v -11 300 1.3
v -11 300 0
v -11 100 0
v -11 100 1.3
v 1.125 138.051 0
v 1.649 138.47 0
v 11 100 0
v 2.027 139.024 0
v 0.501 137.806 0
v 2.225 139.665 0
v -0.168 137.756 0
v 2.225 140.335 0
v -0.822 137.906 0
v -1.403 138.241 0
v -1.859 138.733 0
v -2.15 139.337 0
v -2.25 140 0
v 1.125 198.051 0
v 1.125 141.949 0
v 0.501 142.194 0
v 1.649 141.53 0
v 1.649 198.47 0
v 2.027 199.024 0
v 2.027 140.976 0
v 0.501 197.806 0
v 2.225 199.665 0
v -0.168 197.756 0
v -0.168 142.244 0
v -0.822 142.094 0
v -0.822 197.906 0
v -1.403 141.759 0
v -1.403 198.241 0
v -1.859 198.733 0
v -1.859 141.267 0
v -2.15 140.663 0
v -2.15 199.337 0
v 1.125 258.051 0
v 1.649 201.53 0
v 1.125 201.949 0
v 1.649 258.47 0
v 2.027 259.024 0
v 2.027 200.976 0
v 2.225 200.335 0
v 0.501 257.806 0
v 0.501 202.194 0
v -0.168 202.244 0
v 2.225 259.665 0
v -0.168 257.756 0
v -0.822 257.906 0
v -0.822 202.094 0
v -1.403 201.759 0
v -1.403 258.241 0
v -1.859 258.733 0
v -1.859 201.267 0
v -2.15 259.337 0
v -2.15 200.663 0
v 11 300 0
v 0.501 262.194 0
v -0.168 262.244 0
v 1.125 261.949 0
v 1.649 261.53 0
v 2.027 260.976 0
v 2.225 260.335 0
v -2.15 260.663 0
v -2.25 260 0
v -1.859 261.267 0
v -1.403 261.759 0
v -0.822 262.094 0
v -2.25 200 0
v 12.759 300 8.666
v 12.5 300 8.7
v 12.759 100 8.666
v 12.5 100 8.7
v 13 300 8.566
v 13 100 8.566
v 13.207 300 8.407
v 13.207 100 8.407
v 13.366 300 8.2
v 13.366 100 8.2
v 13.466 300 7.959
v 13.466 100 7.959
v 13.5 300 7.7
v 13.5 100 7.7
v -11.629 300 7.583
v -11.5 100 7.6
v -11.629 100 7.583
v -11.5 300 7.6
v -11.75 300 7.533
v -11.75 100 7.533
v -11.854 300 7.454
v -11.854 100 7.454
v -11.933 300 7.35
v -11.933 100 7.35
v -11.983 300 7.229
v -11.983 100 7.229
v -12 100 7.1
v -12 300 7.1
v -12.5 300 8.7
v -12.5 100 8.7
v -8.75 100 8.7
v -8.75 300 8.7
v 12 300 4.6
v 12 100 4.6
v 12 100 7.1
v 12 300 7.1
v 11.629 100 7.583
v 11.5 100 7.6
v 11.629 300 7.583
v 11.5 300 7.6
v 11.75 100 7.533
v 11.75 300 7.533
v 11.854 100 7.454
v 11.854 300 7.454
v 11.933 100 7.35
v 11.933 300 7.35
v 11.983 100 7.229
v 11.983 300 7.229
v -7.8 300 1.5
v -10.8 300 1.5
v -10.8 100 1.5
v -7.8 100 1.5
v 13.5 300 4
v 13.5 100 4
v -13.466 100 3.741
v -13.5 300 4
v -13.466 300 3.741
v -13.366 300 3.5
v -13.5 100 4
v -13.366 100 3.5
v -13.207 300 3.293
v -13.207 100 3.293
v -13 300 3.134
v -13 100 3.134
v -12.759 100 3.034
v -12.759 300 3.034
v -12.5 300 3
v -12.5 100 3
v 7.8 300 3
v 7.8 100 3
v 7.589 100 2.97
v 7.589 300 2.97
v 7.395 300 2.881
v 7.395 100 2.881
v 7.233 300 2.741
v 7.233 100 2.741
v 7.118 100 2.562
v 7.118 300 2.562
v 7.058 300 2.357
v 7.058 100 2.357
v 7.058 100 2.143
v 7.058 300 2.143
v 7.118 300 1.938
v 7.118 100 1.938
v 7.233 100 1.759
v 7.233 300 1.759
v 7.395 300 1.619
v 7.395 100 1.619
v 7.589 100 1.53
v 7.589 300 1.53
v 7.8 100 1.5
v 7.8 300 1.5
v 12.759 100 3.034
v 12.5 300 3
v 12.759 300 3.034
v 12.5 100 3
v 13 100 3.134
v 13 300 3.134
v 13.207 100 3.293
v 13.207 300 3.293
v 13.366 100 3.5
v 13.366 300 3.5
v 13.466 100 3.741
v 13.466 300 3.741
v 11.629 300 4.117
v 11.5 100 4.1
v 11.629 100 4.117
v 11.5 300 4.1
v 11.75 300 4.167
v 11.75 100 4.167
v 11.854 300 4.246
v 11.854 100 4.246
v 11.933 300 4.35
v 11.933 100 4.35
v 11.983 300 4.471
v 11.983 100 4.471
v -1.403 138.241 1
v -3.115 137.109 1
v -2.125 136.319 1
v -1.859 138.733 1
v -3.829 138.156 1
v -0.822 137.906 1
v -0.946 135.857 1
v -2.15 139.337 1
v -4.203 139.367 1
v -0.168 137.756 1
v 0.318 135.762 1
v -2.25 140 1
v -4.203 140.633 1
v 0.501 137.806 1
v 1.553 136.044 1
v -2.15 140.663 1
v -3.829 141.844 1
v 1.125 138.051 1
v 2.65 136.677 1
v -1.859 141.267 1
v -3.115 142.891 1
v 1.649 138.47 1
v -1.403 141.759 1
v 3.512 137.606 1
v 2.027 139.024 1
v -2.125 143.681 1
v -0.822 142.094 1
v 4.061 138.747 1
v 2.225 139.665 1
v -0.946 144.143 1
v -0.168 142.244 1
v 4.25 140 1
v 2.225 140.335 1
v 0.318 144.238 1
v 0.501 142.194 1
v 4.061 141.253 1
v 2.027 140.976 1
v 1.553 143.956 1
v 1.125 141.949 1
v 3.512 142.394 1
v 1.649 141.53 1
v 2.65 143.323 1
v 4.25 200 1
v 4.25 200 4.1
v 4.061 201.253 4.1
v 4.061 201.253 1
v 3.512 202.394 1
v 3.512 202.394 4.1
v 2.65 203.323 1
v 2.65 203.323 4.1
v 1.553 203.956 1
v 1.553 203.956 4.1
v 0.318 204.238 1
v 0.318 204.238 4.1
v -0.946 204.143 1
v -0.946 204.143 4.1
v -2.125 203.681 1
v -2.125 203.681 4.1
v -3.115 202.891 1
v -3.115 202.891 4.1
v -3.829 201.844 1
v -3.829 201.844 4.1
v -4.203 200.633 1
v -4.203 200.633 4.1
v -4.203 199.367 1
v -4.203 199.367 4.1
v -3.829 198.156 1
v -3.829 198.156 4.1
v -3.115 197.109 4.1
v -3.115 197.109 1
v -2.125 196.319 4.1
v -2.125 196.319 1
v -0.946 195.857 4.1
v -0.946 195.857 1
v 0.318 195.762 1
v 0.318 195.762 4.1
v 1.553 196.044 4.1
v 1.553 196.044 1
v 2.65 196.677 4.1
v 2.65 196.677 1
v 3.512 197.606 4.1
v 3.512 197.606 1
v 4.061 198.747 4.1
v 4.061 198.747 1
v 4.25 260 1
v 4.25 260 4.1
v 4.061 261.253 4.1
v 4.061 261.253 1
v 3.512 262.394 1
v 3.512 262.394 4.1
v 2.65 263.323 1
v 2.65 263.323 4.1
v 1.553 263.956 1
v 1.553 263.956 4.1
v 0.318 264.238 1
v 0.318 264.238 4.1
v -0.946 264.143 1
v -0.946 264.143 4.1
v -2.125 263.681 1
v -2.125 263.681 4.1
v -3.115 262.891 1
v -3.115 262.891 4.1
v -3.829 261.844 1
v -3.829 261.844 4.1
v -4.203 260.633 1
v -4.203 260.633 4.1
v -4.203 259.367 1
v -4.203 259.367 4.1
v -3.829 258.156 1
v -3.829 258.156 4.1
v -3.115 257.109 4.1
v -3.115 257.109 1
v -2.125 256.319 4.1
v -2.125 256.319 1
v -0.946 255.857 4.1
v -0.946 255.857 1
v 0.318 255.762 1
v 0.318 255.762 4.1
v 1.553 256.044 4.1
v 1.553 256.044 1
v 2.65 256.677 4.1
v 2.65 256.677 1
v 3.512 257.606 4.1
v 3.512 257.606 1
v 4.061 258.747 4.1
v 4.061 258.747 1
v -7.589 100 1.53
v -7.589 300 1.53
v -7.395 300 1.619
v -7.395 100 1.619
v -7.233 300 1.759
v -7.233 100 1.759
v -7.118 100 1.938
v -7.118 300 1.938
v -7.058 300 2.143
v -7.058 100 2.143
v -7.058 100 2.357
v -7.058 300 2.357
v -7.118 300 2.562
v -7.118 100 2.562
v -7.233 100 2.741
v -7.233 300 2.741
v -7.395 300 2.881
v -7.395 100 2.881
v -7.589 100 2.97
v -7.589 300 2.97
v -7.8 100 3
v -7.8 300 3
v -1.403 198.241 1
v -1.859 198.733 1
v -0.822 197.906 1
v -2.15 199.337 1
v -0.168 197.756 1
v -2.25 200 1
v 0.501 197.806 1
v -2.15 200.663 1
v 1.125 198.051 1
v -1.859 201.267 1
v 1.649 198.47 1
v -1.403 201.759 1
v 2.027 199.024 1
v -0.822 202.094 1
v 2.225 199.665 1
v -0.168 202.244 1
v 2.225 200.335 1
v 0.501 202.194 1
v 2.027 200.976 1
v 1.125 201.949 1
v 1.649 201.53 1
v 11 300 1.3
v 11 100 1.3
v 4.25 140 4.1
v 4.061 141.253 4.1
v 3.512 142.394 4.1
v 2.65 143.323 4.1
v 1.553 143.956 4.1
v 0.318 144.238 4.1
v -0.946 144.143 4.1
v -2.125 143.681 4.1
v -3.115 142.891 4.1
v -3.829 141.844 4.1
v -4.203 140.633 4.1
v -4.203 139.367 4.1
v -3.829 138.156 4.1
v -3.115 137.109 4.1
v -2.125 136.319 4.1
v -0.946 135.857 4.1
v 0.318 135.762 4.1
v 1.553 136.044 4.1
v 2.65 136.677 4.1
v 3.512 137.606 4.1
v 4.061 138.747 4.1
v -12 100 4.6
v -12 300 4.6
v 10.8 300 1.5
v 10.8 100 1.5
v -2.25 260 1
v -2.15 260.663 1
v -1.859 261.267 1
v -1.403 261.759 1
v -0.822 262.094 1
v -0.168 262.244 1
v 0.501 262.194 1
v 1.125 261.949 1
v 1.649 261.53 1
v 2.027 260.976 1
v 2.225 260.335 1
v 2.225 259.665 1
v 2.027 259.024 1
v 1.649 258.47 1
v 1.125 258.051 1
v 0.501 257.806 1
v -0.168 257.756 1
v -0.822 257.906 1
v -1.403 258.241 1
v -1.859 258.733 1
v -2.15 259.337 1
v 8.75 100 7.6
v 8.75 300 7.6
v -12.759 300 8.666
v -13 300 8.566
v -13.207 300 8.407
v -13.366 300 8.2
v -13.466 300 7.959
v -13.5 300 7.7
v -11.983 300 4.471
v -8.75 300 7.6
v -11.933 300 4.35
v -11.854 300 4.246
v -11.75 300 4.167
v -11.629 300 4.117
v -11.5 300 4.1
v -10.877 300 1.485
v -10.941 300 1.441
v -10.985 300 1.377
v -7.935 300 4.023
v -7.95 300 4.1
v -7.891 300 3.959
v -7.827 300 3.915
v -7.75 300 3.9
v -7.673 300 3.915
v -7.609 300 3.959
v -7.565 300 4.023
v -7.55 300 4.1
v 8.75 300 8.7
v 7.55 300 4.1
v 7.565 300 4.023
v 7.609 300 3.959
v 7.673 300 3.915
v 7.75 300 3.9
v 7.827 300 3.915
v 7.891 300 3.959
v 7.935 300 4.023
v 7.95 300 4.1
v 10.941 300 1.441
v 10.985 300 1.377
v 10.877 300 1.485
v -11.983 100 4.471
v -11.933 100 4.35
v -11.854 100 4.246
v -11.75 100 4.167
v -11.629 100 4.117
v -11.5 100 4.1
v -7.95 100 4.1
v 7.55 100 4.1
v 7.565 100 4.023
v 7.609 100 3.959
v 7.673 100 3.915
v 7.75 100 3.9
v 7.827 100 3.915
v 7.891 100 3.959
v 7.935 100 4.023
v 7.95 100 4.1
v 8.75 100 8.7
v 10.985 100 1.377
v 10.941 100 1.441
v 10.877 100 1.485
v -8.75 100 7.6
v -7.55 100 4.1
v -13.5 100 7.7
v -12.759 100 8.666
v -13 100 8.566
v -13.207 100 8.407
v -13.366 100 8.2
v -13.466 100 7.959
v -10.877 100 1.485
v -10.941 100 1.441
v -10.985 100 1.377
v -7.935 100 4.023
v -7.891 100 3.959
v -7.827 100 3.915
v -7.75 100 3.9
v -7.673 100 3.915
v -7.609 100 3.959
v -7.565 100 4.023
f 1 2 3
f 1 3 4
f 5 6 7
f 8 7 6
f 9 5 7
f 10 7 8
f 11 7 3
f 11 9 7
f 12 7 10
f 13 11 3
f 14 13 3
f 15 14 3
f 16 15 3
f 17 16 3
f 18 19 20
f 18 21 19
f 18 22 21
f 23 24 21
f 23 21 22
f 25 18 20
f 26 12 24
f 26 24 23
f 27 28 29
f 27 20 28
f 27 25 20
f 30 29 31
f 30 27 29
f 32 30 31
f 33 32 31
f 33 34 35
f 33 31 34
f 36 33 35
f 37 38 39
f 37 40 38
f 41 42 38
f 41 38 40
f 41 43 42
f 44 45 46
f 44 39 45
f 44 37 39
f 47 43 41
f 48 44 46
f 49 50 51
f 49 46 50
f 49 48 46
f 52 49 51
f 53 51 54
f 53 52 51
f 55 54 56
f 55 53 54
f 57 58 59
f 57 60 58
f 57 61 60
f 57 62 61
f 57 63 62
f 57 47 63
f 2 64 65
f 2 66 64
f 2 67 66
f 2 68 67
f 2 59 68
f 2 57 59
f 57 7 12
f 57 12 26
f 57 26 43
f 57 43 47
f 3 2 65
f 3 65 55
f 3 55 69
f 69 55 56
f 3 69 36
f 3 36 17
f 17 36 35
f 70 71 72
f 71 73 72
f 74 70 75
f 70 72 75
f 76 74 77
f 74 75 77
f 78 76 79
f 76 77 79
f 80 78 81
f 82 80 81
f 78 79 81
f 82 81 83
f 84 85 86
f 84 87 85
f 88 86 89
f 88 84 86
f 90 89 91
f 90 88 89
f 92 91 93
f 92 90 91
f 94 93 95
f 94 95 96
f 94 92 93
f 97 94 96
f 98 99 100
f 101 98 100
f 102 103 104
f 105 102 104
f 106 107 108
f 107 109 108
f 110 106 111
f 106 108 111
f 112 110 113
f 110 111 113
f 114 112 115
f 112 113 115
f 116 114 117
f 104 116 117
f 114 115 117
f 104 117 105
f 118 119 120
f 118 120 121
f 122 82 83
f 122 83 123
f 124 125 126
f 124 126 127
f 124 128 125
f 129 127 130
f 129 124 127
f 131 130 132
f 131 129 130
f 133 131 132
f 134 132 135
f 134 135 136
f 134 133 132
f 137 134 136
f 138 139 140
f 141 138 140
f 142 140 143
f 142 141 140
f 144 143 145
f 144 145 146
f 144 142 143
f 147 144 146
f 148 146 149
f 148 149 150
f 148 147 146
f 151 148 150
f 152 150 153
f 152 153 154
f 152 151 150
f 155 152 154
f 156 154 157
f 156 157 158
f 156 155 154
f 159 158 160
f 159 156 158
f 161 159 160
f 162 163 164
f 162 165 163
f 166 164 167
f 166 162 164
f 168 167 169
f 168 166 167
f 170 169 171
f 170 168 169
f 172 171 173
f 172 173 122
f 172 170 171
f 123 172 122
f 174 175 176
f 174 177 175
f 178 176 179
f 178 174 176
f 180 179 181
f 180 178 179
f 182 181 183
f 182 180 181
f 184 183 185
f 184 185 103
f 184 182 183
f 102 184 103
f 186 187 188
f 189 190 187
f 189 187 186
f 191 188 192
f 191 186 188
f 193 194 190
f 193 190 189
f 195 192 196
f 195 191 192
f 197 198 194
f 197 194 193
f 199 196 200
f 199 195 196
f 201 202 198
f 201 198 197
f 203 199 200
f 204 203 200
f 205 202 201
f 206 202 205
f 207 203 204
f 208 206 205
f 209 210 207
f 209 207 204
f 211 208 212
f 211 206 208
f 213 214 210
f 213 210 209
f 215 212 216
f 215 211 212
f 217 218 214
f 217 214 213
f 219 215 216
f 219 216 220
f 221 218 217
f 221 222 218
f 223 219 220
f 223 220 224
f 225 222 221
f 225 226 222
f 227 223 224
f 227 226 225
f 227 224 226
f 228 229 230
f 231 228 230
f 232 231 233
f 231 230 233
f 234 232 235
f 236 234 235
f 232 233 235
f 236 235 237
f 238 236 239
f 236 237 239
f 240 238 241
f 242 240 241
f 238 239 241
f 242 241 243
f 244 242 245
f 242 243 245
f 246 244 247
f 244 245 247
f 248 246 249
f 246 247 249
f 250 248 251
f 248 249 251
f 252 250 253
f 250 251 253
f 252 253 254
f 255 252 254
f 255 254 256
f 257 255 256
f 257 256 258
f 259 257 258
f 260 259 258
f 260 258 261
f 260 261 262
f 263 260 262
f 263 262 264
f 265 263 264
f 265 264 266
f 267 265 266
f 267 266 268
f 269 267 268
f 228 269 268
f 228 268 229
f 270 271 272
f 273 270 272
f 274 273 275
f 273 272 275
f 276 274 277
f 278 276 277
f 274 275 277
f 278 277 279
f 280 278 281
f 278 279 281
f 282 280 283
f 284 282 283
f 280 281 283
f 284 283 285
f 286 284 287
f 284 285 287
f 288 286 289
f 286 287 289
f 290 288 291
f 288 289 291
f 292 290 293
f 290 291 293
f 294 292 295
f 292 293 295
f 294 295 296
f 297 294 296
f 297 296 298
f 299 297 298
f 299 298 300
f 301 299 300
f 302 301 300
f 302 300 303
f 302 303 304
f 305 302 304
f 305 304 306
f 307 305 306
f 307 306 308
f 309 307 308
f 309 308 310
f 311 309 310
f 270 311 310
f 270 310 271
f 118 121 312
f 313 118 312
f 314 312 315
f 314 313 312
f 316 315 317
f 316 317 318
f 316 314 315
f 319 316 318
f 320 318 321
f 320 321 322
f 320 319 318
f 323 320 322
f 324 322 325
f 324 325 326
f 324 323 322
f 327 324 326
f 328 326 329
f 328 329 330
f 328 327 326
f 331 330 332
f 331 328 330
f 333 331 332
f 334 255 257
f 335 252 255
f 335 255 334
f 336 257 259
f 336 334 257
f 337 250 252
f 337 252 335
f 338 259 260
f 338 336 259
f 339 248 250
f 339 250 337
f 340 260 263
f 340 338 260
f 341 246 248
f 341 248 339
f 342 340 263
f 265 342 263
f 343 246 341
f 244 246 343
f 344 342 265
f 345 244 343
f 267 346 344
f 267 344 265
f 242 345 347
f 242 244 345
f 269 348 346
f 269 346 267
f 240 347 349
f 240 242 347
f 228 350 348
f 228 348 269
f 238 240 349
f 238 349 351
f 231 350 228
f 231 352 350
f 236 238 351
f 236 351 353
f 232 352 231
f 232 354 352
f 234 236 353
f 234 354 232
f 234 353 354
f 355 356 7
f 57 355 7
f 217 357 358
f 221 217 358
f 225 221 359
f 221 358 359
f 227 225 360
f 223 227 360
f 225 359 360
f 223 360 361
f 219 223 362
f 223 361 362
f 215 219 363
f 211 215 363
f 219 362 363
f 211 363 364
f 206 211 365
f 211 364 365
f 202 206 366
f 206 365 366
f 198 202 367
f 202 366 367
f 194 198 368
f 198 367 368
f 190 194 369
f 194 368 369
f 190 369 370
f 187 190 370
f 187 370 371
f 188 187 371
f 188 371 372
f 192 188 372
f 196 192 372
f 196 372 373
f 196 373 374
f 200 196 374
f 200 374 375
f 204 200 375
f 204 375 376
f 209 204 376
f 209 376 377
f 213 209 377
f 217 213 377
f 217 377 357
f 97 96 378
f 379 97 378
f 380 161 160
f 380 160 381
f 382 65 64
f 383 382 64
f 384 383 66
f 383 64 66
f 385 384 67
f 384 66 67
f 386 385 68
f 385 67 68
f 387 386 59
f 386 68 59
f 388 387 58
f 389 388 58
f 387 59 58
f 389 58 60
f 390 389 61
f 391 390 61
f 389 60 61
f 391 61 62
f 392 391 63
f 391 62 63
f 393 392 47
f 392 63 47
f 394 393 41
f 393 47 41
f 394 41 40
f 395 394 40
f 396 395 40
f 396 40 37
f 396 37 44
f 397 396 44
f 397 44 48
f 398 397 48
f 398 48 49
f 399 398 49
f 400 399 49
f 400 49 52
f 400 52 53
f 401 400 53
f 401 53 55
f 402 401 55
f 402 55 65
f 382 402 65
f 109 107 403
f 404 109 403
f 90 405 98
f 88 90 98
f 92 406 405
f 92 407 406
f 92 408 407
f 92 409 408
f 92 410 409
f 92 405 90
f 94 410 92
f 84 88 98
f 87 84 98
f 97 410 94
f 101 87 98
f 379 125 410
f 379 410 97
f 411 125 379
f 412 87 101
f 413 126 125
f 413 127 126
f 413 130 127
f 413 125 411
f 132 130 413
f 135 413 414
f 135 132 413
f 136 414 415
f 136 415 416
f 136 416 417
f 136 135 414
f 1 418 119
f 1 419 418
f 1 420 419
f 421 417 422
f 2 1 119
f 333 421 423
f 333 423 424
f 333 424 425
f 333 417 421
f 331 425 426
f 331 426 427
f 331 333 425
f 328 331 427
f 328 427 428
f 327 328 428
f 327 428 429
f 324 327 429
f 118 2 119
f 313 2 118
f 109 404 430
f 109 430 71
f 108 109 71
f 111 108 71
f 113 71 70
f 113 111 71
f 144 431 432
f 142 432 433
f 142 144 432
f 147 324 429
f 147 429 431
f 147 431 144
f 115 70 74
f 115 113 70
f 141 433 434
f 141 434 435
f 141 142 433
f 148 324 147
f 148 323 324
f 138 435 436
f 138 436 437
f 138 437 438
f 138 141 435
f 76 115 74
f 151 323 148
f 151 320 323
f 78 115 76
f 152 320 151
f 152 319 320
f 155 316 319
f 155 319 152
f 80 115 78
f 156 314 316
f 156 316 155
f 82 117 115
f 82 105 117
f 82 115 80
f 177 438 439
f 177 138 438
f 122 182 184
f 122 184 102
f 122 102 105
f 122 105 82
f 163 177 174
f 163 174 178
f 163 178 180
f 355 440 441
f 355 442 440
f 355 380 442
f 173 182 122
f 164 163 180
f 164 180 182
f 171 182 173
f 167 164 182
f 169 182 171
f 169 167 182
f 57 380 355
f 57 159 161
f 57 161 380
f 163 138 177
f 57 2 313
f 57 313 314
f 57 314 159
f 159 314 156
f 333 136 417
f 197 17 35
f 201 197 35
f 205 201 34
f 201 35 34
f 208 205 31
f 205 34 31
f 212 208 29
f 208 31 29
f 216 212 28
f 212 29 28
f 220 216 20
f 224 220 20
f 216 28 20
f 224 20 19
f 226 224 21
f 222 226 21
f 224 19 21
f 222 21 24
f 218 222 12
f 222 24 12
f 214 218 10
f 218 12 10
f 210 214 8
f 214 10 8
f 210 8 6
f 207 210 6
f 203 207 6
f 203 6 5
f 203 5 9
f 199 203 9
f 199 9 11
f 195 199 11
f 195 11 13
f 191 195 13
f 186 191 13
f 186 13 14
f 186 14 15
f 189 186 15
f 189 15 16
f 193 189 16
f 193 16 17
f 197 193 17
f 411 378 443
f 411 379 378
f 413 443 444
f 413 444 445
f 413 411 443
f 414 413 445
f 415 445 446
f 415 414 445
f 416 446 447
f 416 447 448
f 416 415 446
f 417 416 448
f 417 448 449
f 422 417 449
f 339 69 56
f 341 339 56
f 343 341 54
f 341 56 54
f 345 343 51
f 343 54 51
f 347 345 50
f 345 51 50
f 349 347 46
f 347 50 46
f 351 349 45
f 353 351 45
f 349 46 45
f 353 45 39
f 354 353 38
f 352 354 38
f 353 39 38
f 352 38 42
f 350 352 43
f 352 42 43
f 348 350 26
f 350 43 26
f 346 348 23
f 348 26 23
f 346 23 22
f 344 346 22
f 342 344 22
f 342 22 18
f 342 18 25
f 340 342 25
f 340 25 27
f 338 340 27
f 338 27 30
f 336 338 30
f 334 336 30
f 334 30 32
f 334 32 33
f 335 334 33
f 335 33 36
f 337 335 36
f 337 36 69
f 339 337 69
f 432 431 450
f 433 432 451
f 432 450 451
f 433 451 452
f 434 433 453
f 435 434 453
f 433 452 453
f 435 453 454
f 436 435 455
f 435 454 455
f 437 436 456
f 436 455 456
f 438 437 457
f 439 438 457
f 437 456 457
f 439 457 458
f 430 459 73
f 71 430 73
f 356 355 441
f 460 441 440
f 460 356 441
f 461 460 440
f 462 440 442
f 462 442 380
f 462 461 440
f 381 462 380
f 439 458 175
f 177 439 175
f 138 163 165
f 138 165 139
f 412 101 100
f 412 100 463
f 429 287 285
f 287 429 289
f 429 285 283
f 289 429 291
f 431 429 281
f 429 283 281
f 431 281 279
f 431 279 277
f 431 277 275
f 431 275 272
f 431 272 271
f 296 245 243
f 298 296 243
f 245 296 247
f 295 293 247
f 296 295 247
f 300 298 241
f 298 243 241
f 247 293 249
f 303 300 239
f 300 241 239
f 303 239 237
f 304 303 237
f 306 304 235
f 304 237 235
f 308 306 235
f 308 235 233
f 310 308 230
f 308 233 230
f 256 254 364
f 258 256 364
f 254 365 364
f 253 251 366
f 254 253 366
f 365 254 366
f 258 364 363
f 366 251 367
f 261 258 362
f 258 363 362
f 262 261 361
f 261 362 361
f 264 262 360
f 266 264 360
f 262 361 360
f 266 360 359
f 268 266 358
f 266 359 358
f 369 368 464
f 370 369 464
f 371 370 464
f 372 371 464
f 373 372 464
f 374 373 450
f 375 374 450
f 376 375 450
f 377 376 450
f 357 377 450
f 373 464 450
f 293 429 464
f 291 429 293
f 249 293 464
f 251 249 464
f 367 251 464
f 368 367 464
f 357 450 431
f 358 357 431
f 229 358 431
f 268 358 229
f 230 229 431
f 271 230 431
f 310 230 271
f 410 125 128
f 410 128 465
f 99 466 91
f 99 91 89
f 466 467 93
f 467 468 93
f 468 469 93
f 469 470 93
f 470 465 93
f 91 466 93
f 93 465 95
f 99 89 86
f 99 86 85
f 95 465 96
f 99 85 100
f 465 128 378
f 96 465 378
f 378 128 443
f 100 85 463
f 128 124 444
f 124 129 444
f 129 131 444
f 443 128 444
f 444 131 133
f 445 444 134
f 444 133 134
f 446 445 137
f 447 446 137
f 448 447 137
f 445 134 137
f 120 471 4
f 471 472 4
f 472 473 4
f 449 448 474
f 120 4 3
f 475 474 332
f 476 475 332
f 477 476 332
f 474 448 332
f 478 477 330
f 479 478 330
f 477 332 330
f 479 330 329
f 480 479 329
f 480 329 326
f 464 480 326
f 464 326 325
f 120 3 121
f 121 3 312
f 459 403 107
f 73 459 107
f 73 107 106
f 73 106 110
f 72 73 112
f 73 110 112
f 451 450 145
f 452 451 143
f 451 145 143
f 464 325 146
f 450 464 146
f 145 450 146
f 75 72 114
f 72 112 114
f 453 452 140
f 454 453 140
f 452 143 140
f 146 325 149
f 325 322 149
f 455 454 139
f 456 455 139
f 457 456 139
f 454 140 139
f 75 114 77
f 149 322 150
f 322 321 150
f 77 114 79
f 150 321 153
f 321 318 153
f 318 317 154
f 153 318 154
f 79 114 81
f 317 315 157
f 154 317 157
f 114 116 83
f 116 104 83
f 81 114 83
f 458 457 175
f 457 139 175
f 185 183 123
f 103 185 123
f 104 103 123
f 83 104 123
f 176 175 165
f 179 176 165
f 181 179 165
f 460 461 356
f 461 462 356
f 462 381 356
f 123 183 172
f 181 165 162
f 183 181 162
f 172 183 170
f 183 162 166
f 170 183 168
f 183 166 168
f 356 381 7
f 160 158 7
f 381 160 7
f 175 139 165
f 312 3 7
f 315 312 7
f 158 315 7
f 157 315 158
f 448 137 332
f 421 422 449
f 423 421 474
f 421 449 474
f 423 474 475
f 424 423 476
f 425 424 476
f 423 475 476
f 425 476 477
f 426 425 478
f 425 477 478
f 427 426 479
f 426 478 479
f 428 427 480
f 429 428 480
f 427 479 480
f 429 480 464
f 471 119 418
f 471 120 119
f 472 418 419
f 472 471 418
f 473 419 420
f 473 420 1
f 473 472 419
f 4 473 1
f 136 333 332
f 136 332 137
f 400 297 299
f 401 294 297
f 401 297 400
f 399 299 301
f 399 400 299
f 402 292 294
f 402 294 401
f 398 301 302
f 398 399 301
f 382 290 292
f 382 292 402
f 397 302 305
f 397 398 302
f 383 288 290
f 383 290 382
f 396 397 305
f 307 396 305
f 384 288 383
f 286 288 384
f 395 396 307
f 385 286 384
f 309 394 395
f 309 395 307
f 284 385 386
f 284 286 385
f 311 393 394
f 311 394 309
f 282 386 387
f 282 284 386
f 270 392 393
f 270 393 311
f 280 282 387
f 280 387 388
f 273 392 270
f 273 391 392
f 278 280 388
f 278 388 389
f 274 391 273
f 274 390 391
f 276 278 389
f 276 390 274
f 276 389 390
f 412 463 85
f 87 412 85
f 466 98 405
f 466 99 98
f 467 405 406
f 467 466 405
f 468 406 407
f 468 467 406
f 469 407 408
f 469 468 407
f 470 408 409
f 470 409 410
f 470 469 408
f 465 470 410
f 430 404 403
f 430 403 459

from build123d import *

# Parameters (mm, degrees)
BOSS_EXTRUDE1_DEPTH                              = 200
CUT_EXTRUDE1_DEPTH                               = 201
F_0_4_0_4_DIAMETER_HOLE1_D                       = 0.4
F_0_4_0_4_DIAMETER_HOLE1_DEPTH                   = 200
CBORE_FOR_M4_HEX_HEAD_MACHINE_SCREW1_D           = 4.5
CBORE_FOR_M4_HEX_HEAD_MACHINE_SCREW1_DEPTH       = 4.1
CBORE_FOR_M4_HEX_HEAD_MACHINE_SCREW1_CBORE_D     = 8.5
CBORE_FOR_M4_HEX_HEAD_MACHINE_SCREW1_CBORE_DEPTH = 3.1
FILLET1_R                                        = 0.2
FILLET2_R                                        = 0.5
FILLET3_R                                        = 1


with BuildPart() as part:
    # Sketch1 → Boss-Extrude1 (new body)
    with BuildSketch(Plane(origin=(0, 300, 0), x_dir=(1, 0, 0), z_dir=(0, 1, 0))):
        with BuildLine():
            Line((-13.5, -3), (-13.5, -8.7))
            Line((-13.5, -8.7), (13.5, -8.7))
            Line((13.5, -8.7), (13.5, -3))
            Line((13.5, -3), (7.8, -3))
            ThreePointArc((7.8, -3), (7.05, -2.25), (7.8, -1.5))
            Line((7.8, -1.5), (11, -1.5))
            Line((11, -1.5), (11, 0))
            Line((11, 0), (-11, 0))
            Line((-11, 0), (-11, -1.5))
            Line((-11, -1.5), (-7.8, -1.5))
            ThreePointArc((-7.8, -1.5), (-7.05, -2.25), (-7.8, -3))
            Line((-7.8, -3), (-13.5, -3))
        make_face()
    extrude(amount=-BOSS_EXTRUDE1_DEPTH)

    # Sketch2 → Cut-Extrude1 (cut, through all)
    with BuildSketch(Plane.XZ.offset(-100)):
        Polygon((8.75, 8.7), (-8.75, 8.7), (-8.75, 7.6), (-12, 7.6), (-12, 4.1), (12, 4.1), (12, 7.6), (8.75, 7.6), align=None)
    extrude(amount=-CUT_EXTRUDE1_DEPTH, mode=Mode.SUBTRACT)

    # Ø0.4 (0.4) Diameter Hole1
    with Locations(Plane(origin=(0, 300, 0), x_dir=(1, 0, 0), z_dir=(0, 1, 0))):
        with Locations((-7.75, -4.1), (7.75, -4.1)):
            Hole(F_0_4_0_4_DIAMETER_HOLE1_D / 2, depth=F_0_4_0_4_DIAMETER_HOLE1_DEPTH)

    # CBORE for M4 Hex Head Machine Screw1
    with Locations(Plane.XY.offset(4.1)):
        with Locations((0, 260), (0, 200), (0, 140), (0, 80), (0, 20)):
            CounterBoreHole(CBORE_FOR_M4_HEX_HEAD_MACHINE_SCREW1_D / 2, CBORE_FOR_M4_HEX_HEAD_MACHINE_SCREW1_CBORE_D / 2, CBORE_FOR_M4_HEX_HEAD_MACHINE_SCREW1_CBORE_DEPTH, depth=CBORE_FOR_M4_HEX_HEAD_MACHINE_SCREW1_DEPTH)

    # Fillet1
    fillet1_edges = [part.edges().sort_by_distance(p)[0] for p in [
        (-11, 200, 1.5),
        (11, 200, 1.5),
    ]]
    fillet(fillet1_edges, radius=FILLET1_R)

    # Fillet2
    fillet2_edges = [part.edges().sort_by_distance(p)[0] for p in [
        (12, 200, 7.6),
        (12, 200, 4.1),
        (-12, 200, 4.1),
        (-12, 200, 7.6),
    ]]
    fillet(fillet2_edges, radius=FILLET2_R)

    # Fillet3
    fillet3_edges = [part.edges().sort_by_distance(p)[0] for p in [
        (13.5, 200, 3),
        (13.5, 200, 8.7),
        (-13.5, 200, 8.7),
        (-13.5, 200, 3),
    ]]
    fillet(fillet3_edges, radius=FILLET3_R)


solid = part.part
